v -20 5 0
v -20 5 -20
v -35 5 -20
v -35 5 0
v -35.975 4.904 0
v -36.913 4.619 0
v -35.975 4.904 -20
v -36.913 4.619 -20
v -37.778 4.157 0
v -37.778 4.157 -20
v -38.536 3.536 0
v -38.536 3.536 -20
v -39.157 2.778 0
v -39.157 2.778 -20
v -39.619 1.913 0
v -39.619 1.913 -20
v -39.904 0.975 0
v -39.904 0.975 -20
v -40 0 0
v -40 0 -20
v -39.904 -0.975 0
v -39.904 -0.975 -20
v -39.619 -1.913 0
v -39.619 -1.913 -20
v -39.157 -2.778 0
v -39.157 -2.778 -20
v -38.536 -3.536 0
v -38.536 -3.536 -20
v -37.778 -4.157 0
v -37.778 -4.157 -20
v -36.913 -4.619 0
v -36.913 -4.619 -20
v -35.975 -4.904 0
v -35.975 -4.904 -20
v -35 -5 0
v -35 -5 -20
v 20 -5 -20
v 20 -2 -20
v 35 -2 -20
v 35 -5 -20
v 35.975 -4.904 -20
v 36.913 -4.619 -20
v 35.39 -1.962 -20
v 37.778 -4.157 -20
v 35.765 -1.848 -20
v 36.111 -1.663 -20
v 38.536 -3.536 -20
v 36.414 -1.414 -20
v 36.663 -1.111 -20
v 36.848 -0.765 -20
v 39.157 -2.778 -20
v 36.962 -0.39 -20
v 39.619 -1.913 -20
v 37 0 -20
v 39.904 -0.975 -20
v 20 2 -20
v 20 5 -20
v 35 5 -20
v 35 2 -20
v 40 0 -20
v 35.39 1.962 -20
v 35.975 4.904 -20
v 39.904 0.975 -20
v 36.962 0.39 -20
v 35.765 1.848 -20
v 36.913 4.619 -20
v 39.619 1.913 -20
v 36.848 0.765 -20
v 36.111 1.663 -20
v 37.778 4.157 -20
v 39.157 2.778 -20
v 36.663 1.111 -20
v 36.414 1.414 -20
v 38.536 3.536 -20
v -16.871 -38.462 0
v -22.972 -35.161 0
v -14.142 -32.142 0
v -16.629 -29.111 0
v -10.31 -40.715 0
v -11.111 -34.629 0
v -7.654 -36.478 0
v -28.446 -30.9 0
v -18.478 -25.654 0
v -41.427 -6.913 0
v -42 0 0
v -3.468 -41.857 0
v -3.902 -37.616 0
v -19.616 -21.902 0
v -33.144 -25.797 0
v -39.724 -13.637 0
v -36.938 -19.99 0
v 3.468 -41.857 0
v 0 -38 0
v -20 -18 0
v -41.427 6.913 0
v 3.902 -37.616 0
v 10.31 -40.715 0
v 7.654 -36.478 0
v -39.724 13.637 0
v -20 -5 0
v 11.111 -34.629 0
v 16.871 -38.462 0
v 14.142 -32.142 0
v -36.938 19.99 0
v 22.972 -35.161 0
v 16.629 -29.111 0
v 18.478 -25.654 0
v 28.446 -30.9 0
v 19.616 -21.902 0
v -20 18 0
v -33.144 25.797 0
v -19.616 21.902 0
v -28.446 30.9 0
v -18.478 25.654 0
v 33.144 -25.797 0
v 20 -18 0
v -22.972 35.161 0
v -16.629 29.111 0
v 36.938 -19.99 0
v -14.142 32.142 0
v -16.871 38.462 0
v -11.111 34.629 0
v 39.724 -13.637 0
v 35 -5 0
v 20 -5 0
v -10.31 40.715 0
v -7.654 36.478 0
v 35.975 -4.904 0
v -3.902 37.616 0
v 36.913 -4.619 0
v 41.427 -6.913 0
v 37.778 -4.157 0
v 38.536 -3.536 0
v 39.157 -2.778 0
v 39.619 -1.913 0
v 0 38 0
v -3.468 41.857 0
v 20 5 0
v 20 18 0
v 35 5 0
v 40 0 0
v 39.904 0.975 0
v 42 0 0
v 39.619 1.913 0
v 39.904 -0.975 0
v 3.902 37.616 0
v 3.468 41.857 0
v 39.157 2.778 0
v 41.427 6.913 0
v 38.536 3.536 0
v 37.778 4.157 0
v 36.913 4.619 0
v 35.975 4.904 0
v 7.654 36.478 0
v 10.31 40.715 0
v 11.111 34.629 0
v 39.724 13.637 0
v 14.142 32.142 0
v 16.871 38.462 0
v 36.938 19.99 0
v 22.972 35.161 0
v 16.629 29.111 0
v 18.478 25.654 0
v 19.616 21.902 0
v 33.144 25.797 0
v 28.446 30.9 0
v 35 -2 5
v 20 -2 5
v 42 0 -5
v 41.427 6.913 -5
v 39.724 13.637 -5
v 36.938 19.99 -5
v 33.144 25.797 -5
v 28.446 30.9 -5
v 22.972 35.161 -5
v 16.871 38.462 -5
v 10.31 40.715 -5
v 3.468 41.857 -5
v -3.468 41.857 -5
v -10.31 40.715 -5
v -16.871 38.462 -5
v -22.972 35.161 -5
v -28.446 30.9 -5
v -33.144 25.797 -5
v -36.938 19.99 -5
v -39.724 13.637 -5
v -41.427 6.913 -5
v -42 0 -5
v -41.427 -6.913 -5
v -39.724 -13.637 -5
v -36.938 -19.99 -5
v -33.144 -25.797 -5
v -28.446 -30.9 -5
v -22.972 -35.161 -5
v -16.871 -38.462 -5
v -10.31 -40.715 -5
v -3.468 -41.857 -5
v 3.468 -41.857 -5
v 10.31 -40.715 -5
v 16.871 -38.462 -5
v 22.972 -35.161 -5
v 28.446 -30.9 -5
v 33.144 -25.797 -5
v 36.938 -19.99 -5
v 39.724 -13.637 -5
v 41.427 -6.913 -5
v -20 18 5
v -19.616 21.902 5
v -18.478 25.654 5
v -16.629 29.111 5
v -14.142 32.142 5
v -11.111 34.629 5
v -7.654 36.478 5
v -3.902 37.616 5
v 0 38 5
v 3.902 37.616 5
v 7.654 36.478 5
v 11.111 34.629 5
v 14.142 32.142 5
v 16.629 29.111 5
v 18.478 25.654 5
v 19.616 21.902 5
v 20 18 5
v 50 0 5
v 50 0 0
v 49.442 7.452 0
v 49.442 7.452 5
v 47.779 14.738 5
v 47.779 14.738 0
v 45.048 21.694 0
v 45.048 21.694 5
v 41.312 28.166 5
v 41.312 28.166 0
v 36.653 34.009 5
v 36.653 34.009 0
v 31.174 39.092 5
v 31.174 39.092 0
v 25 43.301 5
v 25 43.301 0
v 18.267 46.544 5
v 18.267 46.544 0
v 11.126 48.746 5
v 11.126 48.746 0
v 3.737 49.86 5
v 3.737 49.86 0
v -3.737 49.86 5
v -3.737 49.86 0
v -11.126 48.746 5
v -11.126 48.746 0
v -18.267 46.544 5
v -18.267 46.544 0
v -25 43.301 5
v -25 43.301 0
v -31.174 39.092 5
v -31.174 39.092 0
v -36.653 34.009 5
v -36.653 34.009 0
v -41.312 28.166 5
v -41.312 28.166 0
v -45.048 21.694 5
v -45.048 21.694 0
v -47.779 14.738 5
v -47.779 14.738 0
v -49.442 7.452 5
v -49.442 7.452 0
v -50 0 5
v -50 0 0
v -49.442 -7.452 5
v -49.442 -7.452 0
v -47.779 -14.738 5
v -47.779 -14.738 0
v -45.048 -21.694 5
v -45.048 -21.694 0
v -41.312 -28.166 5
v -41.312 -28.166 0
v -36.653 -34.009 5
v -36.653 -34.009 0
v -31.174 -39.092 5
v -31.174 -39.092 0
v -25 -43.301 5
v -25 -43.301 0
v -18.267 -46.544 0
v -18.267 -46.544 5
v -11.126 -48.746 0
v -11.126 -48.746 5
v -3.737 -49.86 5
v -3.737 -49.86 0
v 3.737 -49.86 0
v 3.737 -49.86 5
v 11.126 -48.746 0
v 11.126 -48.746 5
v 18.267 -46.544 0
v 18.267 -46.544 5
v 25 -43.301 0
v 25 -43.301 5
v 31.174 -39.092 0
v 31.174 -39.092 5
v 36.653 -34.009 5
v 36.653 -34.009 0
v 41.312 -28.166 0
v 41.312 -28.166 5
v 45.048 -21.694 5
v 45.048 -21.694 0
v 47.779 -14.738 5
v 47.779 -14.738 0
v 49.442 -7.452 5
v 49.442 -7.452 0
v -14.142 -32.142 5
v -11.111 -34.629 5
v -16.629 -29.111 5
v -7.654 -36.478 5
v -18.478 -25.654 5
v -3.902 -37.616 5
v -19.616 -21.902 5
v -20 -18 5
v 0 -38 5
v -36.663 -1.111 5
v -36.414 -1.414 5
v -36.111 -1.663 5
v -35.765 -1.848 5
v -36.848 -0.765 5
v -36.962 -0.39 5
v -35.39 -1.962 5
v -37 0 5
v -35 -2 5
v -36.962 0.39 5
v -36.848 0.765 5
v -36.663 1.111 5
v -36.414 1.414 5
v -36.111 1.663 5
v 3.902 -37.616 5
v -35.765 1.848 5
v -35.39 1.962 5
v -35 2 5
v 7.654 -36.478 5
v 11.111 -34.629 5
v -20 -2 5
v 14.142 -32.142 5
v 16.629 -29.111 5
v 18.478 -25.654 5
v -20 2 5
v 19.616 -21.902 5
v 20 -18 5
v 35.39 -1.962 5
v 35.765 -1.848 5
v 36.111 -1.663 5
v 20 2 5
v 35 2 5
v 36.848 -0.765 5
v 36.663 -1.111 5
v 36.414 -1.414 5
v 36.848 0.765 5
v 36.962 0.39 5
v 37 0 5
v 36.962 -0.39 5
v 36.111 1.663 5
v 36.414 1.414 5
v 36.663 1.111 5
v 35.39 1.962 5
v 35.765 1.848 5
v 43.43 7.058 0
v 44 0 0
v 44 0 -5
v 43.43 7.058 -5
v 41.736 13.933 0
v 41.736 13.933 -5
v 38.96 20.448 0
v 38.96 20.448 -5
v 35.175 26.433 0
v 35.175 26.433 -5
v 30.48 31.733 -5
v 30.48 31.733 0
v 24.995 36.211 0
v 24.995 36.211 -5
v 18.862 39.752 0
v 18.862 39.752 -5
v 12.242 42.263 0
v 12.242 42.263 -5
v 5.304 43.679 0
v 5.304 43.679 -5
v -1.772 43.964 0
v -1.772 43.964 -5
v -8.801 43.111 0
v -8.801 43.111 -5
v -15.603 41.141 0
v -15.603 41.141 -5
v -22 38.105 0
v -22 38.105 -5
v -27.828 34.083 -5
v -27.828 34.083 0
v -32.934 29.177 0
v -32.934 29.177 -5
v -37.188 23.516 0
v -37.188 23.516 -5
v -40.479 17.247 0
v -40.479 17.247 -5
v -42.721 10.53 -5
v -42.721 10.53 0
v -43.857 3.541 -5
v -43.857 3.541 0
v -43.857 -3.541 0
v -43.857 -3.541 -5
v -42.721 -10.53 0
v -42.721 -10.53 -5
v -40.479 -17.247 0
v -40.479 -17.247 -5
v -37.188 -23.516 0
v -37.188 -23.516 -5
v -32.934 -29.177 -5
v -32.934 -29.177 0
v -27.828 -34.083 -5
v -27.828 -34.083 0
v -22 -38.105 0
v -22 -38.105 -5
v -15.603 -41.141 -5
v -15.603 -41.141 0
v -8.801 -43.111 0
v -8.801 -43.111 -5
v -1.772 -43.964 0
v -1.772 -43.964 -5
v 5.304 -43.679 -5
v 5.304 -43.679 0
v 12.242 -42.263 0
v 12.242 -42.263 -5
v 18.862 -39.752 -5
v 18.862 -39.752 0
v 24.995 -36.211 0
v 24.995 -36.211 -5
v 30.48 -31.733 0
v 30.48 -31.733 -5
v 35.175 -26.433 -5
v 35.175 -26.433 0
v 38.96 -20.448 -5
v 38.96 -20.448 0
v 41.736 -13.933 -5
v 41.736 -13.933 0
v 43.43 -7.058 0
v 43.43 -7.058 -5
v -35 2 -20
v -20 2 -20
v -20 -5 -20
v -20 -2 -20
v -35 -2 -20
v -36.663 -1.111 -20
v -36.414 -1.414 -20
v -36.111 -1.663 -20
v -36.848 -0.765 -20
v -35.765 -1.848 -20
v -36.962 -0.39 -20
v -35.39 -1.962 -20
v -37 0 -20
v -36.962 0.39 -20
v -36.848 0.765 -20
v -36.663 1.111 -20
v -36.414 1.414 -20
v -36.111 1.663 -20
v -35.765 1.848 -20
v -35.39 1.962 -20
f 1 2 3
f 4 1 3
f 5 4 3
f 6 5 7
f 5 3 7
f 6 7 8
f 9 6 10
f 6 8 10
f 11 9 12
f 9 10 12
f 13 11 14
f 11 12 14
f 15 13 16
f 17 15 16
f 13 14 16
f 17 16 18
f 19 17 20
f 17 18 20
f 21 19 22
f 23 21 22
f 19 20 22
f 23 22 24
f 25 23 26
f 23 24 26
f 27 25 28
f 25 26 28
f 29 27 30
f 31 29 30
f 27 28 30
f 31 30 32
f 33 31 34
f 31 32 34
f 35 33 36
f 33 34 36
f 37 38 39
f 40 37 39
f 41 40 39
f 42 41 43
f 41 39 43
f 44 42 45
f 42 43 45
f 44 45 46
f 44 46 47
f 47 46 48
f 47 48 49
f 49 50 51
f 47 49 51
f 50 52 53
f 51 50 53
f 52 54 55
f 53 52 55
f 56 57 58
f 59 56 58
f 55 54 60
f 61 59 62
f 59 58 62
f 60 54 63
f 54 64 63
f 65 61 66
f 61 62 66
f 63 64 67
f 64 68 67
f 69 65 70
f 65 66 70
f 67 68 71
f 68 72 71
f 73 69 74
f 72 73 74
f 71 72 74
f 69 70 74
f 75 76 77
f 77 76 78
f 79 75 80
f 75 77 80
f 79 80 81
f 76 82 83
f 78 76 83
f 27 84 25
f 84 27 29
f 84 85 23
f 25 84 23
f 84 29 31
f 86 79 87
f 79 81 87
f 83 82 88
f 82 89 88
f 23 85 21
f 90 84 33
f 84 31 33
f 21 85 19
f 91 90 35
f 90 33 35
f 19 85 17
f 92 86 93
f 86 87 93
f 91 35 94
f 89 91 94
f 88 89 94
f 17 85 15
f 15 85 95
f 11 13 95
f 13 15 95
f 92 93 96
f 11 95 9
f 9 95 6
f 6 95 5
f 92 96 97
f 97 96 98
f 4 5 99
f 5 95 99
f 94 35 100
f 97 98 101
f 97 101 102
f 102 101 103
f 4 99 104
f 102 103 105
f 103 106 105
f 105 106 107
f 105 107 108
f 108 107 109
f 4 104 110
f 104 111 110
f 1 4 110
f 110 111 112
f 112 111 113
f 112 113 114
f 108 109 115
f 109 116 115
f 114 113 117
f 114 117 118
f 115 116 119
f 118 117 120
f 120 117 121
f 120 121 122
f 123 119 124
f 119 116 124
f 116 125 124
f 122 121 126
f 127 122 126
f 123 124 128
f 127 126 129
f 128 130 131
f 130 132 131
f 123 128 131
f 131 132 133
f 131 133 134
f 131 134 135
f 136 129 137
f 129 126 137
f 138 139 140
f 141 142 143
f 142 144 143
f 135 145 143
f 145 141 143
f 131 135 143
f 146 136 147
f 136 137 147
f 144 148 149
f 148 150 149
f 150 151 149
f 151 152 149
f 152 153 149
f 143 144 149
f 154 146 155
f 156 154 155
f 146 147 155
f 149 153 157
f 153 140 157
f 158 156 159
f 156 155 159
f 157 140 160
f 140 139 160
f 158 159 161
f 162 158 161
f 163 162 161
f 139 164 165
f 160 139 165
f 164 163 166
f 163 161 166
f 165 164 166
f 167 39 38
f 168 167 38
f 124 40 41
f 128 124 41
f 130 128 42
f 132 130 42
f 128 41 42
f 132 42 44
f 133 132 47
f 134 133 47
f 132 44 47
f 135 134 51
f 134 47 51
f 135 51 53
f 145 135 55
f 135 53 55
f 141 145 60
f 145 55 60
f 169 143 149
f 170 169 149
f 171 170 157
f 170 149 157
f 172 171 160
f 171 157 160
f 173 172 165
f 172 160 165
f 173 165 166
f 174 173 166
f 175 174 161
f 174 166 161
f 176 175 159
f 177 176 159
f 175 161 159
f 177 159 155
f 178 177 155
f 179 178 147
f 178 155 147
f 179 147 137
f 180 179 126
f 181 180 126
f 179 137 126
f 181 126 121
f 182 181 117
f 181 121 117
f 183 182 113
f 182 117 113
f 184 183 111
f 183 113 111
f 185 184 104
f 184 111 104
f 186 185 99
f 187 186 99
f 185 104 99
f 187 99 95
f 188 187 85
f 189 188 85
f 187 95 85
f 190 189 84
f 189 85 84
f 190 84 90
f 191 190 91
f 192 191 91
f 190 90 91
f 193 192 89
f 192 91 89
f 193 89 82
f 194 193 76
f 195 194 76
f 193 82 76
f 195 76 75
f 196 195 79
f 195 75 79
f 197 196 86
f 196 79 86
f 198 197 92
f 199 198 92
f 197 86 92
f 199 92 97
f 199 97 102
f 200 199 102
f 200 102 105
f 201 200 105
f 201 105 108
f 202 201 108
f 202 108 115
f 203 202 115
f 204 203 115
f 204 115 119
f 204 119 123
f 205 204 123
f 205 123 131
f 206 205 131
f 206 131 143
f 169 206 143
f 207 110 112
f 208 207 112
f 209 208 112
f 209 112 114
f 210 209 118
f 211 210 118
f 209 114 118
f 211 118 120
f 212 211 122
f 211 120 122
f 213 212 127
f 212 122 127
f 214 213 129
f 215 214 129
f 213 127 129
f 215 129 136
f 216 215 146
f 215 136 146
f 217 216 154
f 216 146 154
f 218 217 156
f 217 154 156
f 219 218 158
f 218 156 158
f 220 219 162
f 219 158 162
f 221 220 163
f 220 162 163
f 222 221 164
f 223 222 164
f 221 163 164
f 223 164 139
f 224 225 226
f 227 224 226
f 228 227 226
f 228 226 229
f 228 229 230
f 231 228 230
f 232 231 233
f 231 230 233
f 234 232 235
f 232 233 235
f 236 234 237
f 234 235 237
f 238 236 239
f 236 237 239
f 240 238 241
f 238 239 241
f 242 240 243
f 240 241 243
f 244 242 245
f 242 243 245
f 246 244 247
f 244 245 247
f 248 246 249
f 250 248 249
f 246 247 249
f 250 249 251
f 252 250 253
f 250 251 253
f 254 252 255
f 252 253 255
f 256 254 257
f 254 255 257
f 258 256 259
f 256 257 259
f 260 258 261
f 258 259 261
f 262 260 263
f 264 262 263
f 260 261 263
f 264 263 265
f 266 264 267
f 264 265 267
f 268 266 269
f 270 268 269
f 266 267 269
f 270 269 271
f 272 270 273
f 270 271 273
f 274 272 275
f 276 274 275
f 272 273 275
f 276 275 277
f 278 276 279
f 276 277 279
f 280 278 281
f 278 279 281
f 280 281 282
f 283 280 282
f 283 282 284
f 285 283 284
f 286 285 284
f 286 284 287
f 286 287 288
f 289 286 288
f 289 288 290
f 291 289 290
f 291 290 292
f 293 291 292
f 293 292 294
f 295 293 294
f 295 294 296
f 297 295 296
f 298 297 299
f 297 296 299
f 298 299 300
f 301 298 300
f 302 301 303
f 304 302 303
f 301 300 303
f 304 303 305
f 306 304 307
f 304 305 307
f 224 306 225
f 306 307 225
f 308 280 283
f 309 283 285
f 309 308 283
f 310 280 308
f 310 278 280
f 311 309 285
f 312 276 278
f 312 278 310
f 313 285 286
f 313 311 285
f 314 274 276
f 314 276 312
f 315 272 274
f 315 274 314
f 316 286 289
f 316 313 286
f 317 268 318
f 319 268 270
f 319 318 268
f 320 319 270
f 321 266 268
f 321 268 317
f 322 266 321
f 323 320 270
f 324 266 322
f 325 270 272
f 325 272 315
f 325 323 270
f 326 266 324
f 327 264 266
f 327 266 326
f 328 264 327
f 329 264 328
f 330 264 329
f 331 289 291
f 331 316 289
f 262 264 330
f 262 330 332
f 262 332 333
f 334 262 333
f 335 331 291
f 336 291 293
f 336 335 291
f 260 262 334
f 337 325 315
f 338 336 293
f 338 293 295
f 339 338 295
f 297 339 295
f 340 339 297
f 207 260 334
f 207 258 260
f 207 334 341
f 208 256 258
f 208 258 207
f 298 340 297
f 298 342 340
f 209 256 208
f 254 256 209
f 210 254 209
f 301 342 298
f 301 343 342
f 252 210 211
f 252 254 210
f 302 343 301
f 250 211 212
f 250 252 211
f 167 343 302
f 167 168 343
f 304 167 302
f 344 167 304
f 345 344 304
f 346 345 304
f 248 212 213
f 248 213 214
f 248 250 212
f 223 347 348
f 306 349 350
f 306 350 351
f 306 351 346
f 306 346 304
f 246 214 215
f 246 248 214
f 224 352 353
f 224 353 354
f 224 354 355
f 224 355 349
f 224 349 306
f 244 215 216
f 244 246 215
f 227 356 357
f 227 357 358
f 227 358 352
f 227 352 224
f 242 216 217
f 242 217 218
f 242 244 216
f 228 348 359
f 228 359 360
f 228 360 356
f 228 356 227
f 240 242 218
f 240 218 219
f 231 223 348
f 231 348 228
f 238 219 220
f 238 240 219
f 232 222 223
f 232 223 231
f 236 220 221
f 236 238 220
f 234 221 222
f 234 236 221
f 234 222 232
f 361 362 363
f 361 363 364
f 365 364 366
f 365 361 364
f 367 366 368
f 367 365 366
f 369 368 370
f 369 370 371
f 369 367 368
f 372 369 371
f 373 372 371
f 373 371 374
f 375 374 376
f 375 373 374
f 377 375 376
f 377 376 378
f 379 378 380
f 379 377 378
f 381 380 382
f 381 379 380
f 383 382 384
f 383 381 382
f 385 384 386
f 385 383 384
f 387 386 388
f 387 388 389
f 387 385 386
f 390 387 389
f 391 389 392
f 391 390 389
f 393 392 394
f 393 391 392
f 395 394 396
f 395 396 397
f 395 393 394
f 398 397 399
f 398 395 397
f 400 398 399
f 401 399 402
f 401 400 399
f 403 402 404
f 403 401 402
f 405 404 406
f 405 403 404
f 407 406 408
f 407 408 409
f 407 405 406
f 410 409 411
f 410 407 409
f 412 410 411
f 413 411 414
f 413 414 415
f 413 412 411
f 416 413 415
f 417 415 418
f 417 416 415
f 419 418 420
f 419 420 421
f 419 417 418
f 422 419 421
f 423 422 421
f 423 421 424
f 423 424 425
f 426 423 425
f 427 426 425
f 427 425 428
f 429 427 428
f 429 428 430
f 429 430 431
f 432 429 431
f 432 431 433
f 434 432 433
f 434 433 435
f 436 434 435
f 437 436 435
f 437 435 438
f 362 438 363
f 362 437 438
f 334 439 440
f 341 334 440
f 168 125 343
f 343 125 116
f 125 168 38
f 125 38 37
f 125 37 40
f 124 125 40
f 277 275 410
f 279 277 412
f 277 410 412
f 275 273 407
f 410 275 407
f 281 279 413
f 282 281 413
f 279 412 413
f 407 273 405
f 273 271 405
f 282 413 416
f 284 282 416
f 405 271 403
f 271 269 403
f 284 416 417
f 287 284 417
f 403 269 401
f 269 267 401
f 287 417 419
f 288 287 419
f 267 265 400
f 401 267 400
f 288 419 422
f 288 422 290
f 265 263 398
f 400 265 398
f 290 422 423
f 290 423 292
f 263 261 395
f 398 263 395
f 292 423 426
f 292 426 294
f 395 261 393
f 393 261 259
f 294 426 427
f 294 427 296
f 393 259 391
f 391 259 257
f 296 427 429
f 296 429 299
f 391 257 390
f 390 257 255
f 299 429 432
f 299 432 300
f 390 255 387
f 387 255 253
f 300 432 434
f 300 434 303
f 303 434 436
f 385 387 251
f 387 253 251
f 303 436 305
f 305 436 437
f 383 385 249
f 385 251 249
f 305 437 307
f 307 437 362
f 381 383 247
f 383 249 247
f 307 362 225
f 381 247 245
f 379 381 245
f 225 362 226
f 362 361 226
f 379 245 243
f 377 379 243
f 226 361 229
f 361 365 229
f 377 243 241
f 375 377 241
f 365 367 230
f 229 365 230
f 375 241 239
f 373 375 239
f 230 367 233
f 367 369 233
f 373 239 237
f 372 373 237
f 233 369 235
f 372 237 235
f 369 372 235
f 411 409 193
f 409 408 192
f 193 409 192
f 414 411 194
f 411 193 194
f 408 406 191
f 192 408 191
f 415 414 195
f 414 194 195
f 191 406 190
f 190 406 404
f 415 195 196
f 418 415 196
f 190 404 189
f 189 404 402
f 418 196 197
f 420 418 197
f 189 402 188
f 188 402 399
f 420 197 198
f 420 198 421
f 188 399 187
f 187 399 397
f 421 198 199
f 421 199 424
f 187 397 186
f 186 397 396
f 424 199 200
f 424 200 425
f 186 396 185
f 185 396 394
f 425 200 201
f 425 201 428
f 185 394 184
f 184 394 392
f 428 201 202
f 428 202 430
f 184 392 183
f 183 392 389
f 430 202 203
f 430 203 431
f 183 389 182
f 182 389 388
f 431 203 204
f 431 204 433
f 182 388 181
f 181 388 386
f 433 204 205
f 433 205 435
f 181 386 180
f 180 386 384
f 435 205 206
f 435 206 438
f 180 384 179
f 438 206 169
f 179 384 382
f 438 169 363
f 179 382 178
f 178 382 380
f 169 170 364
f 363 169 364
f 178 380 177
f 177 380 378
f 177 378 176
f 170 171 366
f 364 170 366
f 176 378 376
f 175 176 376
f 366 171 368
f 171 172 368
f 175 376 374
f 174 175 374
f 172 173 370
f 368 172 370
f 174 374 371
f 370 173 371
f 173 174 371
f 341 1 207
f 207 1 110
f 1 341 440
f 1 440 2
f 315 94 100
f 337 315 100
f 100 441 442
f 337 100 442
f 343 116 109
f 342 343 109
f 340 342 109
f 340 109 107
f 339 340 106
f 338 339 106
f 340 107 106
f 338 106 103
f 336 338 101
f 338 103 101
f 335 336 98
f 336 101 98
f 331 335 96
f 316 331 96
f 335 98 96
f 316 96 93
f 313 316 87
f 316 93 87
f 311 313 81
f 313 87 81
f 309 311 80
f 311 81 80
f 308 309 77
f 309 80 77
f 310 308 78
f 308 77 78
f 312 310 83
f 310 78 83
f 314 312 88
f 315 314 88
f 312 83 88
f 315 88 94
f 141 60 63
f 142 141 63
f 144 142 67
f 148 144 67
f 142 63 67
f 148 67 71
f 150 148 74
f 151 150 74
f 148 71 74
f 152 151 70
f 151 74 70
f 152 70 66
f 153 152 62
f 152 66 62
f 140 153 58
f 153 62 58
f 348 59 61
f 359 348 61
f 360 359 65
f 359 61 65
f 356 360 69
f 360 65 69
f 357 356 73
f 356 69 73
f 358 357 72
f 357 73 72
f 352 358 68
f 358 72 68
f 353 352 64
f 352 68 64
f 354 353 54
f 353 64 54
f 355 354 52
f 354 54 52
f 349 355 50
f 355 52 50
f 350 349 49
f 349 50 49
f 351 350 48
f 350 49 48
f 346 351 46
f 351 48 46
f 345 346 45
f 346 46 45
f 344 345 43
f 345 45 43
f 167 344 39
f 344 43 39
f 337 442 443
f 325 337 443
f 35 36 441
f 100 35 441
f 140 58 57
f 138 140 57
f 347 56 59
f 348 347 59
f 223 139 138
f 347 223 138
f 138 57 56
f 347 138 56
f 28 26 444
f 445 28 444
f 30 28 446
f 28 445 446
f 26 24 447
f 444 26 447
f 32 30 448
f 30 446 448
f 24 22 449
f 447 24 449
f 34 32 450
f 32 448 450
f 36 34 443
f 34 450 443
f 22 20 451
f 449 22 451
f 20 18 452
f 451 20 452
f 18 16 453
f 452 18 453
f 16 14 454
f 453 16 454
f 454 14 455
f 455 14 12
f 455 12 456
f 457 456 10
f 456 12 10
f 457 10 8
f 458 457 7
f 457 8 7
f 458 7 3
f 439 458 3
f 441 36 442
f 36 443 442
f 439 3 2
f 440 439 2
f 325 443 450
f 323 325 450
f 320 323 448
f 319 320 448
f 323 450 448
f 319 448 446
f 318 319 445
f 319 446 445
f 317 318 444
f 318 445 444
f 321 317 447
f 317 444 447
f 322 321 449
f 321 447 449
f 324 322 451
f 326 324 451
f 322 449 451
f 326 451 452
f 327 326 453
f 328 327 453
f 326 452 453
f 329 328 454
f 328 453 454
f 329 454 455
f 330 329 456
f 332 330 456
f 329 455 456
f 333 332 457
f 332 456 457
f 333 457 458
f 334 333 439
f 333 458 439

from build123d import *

# Parameters (mm, degrees)
ESBO_O1_R                = 50
RESSALTO_EXTRUS_O1_DEPTH = 5
RESSALTO_EXTRUS_O2_START = -20
RESSALTO_EXTRUS_O2_DEPTH = 20
ESBO_O1_4_R              = 44
ESBO_O1_4_R_2            = 42
RESSALTO_EXTRUS_O3_DEPTH = 5


with BuildPart() as part:
    # Esboço1 → Ressalto-extrusão1 (new body)
    with BuildSketch(Plane.XY):
        Circle(ESBO_O1_R)
        with BuildLine():
            ThreePointArc((20, -18), (0, -38), (-20, -18))
            Line((-20, -18), (-20, -2))
            Line((-20, -2), (-35, -2))
            ThreePointArc((-35, -2), (-37, 0), (-35, 2))
            Line((-35, 2), (-20, 2))
            Line((-20, 2), (-20, 18))
            ThreePointArc((-20, 18), (0, 38), (20, 18))
            Line((20, 18), (20, 2))
            Line((20, 2), (35, 2))
            ThreePointArc((35, 2), (37, 0), (35, -2))
            Line((35, -2), (20, -2))
            Line((20, -2), (20, -18))
        make_face(mode=Mode.SUBTRACT)
    extrude(amount=RESSALTO_EXTRUS_O1_DEPTH)

    # Esboço1<3> → Ressalto-extrusão2 (add)
    with BuildSketch(Plane.XY.offset(RESSALTO_EXTRUS_O2_START)):
        with BuildLine():
            ThreePointArc((35, 2), (37, 0), (35, -2))
            Line((35, -2), (20, -2))
            Line((20, -2), (20, -5))
            Line((20, -5), (35, -5))
            ThreePointArc((35, -5), (40, 0), (35, 5))
            Line((35, 5), (20, 5))
            Line((20, 5), (20, 2))
            Line((20, 2), (35, 2))
        make_face()
        with BuildLine():
            Line((-35, -5), (-20, -5))
            Line((-20, -5), (-20, -2))
            Line((-20, -2), (-35, -2))
            ThreePointArc((-35, -2), (-37, 0), (-35, 2))
            Line((-35, 2), (-20, 2))
            Line((-20, 2), (-20, 5))
            Line((-20, 5), (-35, 5))
            ThreePointArc((-35, 5), (-40, 0), (-35, -5))
        make_face()
    extrude(amount=RESSALTO_EXTRUS_O2_DEPTH)

    # Esboço1<4> → Ressalto-extrusão3 (add)
    with BuildSketch(Plane.XY):
        Circle(ESBO_O1_4_R)
        Circle(ESBO_O1_4_R_2, mode=Mode.SUBTRACT)
    extrude(amount=-RESSALTO_EXTRUS_O3_DEPTH)


solid = part.part
